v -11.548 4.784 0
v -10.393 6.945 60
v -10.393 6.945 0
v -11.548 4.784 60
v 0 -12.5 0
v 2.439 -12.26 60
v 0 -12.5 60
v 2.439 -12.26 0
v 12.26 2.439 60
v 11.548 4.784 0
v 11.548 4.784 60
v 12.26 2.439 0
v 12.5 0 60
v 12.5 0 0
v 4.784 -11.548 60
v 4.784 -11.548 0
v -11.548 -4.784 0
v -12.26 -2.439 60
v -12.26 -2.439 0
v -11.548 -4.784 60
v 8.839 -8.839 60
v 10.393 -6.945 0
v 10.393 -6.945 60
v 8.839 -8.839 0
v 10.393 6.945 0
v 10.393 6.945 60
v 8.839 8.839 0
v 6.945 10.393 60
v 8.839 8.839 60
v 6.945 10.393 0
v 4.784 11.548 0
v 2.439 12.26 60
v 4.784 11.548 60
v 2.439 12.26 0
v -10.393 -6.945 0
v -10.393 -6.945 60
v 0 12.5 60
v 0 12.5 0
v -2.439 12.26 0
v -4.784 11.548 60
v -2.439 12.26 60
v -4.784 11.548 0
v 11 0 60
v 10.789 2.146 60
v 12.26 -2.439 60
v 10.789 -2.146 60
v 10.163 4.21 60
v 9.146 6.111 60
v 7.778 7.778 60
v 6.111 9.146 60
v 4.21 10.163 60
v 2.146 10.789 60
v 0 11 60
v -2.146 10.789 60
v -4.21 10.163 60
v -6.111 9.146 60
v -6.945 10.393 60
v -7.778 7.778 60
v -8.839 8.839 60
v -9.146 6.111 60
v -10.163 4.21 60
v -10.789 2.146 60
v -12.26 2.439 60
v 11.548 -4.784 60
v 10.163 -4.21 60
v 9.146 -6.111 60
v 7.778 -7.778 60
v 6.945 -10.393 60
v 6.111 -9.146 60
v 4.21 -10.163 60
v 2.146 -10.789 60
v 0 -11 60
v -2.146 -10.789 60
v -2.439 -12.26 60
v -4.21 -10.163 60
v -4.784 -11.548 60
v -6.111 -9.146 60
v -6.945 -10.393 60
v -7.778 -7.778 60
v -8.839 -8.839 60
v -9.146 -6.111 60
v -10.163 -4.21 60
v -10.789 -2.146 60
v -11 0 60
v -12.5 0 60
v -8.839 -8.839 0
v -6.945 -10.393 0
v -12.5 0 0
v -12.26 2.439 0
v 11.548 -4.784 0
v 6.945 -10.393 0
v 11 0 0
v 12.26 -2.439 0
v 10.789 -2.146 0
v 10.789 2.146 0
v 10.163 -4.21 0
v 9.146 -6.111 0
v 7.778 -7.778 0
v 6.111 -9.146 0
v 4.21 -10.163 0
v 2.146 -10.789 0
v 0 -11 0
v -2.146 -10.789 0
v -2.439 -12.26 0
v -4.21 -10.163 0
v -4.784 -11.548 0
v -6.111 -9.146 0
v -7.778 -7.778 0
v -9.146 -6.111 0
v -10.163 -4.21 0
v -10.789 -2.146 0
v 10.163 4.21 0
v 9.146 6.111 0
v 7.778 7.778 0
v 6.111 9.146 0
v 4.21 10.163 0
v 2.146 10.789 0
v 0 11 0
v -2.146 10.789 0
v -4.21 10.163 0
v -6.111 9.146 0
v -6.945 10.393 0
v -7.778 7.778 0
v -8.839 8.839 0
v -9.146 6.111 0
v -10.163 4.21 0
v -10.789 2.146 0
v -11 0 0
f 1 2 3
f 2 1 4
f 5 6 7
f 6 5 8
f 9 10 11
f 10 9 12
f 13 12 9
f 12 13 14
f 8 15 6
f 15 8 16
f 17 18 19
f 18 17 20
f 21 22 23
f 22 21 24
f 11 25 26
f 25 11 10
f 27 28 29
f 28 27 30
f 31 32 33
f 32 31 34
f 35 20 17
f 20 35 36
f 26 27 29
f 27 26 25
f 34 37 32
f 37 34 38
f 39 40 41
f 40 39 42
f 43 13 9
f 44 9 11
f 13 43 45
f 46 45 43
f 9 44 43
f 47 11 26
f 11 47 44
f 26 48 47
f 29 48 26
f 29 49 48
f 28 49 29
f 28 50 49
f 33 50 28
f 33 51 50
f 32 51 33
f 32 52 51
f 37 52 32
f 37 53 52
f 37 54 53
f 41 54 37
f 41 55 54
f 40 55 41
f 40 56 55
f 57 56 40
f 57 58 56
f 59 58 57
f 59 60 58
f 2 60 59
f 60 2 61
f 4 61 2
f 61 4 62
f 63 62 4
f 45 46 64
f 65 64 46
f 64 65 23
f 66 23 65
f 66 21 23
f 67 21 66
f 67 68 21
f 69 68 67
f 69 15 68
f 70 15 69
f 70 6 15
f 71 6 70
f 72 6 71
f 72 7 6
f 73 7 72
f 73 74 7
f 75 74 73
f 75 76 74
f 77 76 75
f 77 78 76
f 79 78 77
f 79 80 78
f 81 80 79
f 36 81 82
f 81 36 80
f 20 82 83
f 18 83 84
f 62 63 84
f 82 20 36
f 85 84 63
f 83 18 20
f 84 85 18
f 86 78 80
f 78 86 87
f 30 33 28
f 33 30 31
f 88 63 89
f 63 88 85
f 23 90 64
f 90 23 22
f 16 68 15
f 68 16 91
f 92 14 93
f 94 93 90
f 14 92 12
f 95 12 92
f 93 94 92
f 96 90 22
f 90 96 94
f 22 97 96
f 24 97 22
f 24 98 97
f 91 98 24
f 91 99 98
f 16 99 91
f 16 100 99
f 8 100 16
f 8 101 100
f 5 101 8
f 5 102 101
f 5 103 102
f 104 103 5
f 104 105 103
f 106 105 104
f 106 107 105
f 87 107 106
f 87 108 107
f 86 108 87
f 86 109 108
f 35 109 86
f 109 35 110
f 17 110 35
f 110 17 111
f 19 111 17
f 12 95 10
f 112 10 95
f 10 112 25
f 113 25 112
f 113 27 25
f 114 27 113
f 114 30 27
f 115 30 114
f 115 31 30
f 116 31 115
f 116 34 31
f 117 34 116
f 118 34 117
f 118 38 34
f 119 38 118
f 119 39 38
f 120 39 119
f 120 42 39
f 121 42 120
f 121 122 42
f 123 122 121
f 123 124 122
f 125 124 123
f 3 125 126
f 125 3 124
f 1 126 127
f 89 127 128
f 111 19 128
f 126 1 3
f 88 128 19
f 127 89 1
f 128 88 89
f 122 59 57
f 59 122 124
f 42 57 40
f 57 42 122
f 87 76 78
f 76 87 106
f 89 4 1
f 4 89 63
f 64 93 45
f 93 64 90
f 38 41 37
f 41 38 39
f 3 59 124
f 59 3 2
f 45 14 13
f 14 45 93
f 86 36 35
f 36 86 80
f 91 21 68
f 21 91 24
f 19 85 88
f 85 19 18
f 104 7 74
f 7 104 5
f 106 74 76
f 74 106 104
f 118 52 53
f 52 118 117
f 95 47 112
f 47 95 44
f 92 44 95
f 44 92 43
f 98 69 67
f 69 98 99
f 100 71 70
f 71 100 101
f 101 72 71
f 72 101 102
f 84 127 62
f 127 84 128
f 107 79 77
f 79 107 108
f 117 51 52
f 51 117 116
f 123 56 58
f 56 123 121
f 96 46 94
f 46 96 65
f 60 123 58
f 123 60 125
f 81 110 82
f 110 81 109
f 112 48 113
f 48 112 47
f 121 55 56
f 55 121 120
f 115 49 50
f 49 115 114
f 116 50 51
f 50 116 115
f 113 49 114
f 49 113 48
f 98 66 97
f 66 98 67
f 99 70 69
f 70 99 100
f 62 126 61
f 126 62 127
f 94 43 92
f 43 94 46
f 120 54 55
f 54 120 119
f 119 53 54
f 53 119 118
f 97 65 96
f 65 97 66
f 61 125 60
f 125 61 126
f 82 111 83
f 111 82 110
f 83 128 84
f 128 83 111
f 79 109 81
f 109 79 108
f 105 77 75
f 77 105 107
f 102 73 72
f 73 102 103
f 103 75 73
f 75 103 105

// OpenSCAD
$fn = 32;

// ----------------------------------------------------------------------
// Thin tube: 1.5 mm wall
// ----------------------------------------------------------------------

// --- parameters (mm) ---
tube_od = 25;             // outer diameter
tube_h = 60;              // height, Z
wall = 1.5;               // wall thickness

difference() {
  cylinder(h = tube_h, d = tube_od);
  translate([0, 0, -1]) cylinder(h = tube_h + 2, d = tube_od - 2 * wall);
}
